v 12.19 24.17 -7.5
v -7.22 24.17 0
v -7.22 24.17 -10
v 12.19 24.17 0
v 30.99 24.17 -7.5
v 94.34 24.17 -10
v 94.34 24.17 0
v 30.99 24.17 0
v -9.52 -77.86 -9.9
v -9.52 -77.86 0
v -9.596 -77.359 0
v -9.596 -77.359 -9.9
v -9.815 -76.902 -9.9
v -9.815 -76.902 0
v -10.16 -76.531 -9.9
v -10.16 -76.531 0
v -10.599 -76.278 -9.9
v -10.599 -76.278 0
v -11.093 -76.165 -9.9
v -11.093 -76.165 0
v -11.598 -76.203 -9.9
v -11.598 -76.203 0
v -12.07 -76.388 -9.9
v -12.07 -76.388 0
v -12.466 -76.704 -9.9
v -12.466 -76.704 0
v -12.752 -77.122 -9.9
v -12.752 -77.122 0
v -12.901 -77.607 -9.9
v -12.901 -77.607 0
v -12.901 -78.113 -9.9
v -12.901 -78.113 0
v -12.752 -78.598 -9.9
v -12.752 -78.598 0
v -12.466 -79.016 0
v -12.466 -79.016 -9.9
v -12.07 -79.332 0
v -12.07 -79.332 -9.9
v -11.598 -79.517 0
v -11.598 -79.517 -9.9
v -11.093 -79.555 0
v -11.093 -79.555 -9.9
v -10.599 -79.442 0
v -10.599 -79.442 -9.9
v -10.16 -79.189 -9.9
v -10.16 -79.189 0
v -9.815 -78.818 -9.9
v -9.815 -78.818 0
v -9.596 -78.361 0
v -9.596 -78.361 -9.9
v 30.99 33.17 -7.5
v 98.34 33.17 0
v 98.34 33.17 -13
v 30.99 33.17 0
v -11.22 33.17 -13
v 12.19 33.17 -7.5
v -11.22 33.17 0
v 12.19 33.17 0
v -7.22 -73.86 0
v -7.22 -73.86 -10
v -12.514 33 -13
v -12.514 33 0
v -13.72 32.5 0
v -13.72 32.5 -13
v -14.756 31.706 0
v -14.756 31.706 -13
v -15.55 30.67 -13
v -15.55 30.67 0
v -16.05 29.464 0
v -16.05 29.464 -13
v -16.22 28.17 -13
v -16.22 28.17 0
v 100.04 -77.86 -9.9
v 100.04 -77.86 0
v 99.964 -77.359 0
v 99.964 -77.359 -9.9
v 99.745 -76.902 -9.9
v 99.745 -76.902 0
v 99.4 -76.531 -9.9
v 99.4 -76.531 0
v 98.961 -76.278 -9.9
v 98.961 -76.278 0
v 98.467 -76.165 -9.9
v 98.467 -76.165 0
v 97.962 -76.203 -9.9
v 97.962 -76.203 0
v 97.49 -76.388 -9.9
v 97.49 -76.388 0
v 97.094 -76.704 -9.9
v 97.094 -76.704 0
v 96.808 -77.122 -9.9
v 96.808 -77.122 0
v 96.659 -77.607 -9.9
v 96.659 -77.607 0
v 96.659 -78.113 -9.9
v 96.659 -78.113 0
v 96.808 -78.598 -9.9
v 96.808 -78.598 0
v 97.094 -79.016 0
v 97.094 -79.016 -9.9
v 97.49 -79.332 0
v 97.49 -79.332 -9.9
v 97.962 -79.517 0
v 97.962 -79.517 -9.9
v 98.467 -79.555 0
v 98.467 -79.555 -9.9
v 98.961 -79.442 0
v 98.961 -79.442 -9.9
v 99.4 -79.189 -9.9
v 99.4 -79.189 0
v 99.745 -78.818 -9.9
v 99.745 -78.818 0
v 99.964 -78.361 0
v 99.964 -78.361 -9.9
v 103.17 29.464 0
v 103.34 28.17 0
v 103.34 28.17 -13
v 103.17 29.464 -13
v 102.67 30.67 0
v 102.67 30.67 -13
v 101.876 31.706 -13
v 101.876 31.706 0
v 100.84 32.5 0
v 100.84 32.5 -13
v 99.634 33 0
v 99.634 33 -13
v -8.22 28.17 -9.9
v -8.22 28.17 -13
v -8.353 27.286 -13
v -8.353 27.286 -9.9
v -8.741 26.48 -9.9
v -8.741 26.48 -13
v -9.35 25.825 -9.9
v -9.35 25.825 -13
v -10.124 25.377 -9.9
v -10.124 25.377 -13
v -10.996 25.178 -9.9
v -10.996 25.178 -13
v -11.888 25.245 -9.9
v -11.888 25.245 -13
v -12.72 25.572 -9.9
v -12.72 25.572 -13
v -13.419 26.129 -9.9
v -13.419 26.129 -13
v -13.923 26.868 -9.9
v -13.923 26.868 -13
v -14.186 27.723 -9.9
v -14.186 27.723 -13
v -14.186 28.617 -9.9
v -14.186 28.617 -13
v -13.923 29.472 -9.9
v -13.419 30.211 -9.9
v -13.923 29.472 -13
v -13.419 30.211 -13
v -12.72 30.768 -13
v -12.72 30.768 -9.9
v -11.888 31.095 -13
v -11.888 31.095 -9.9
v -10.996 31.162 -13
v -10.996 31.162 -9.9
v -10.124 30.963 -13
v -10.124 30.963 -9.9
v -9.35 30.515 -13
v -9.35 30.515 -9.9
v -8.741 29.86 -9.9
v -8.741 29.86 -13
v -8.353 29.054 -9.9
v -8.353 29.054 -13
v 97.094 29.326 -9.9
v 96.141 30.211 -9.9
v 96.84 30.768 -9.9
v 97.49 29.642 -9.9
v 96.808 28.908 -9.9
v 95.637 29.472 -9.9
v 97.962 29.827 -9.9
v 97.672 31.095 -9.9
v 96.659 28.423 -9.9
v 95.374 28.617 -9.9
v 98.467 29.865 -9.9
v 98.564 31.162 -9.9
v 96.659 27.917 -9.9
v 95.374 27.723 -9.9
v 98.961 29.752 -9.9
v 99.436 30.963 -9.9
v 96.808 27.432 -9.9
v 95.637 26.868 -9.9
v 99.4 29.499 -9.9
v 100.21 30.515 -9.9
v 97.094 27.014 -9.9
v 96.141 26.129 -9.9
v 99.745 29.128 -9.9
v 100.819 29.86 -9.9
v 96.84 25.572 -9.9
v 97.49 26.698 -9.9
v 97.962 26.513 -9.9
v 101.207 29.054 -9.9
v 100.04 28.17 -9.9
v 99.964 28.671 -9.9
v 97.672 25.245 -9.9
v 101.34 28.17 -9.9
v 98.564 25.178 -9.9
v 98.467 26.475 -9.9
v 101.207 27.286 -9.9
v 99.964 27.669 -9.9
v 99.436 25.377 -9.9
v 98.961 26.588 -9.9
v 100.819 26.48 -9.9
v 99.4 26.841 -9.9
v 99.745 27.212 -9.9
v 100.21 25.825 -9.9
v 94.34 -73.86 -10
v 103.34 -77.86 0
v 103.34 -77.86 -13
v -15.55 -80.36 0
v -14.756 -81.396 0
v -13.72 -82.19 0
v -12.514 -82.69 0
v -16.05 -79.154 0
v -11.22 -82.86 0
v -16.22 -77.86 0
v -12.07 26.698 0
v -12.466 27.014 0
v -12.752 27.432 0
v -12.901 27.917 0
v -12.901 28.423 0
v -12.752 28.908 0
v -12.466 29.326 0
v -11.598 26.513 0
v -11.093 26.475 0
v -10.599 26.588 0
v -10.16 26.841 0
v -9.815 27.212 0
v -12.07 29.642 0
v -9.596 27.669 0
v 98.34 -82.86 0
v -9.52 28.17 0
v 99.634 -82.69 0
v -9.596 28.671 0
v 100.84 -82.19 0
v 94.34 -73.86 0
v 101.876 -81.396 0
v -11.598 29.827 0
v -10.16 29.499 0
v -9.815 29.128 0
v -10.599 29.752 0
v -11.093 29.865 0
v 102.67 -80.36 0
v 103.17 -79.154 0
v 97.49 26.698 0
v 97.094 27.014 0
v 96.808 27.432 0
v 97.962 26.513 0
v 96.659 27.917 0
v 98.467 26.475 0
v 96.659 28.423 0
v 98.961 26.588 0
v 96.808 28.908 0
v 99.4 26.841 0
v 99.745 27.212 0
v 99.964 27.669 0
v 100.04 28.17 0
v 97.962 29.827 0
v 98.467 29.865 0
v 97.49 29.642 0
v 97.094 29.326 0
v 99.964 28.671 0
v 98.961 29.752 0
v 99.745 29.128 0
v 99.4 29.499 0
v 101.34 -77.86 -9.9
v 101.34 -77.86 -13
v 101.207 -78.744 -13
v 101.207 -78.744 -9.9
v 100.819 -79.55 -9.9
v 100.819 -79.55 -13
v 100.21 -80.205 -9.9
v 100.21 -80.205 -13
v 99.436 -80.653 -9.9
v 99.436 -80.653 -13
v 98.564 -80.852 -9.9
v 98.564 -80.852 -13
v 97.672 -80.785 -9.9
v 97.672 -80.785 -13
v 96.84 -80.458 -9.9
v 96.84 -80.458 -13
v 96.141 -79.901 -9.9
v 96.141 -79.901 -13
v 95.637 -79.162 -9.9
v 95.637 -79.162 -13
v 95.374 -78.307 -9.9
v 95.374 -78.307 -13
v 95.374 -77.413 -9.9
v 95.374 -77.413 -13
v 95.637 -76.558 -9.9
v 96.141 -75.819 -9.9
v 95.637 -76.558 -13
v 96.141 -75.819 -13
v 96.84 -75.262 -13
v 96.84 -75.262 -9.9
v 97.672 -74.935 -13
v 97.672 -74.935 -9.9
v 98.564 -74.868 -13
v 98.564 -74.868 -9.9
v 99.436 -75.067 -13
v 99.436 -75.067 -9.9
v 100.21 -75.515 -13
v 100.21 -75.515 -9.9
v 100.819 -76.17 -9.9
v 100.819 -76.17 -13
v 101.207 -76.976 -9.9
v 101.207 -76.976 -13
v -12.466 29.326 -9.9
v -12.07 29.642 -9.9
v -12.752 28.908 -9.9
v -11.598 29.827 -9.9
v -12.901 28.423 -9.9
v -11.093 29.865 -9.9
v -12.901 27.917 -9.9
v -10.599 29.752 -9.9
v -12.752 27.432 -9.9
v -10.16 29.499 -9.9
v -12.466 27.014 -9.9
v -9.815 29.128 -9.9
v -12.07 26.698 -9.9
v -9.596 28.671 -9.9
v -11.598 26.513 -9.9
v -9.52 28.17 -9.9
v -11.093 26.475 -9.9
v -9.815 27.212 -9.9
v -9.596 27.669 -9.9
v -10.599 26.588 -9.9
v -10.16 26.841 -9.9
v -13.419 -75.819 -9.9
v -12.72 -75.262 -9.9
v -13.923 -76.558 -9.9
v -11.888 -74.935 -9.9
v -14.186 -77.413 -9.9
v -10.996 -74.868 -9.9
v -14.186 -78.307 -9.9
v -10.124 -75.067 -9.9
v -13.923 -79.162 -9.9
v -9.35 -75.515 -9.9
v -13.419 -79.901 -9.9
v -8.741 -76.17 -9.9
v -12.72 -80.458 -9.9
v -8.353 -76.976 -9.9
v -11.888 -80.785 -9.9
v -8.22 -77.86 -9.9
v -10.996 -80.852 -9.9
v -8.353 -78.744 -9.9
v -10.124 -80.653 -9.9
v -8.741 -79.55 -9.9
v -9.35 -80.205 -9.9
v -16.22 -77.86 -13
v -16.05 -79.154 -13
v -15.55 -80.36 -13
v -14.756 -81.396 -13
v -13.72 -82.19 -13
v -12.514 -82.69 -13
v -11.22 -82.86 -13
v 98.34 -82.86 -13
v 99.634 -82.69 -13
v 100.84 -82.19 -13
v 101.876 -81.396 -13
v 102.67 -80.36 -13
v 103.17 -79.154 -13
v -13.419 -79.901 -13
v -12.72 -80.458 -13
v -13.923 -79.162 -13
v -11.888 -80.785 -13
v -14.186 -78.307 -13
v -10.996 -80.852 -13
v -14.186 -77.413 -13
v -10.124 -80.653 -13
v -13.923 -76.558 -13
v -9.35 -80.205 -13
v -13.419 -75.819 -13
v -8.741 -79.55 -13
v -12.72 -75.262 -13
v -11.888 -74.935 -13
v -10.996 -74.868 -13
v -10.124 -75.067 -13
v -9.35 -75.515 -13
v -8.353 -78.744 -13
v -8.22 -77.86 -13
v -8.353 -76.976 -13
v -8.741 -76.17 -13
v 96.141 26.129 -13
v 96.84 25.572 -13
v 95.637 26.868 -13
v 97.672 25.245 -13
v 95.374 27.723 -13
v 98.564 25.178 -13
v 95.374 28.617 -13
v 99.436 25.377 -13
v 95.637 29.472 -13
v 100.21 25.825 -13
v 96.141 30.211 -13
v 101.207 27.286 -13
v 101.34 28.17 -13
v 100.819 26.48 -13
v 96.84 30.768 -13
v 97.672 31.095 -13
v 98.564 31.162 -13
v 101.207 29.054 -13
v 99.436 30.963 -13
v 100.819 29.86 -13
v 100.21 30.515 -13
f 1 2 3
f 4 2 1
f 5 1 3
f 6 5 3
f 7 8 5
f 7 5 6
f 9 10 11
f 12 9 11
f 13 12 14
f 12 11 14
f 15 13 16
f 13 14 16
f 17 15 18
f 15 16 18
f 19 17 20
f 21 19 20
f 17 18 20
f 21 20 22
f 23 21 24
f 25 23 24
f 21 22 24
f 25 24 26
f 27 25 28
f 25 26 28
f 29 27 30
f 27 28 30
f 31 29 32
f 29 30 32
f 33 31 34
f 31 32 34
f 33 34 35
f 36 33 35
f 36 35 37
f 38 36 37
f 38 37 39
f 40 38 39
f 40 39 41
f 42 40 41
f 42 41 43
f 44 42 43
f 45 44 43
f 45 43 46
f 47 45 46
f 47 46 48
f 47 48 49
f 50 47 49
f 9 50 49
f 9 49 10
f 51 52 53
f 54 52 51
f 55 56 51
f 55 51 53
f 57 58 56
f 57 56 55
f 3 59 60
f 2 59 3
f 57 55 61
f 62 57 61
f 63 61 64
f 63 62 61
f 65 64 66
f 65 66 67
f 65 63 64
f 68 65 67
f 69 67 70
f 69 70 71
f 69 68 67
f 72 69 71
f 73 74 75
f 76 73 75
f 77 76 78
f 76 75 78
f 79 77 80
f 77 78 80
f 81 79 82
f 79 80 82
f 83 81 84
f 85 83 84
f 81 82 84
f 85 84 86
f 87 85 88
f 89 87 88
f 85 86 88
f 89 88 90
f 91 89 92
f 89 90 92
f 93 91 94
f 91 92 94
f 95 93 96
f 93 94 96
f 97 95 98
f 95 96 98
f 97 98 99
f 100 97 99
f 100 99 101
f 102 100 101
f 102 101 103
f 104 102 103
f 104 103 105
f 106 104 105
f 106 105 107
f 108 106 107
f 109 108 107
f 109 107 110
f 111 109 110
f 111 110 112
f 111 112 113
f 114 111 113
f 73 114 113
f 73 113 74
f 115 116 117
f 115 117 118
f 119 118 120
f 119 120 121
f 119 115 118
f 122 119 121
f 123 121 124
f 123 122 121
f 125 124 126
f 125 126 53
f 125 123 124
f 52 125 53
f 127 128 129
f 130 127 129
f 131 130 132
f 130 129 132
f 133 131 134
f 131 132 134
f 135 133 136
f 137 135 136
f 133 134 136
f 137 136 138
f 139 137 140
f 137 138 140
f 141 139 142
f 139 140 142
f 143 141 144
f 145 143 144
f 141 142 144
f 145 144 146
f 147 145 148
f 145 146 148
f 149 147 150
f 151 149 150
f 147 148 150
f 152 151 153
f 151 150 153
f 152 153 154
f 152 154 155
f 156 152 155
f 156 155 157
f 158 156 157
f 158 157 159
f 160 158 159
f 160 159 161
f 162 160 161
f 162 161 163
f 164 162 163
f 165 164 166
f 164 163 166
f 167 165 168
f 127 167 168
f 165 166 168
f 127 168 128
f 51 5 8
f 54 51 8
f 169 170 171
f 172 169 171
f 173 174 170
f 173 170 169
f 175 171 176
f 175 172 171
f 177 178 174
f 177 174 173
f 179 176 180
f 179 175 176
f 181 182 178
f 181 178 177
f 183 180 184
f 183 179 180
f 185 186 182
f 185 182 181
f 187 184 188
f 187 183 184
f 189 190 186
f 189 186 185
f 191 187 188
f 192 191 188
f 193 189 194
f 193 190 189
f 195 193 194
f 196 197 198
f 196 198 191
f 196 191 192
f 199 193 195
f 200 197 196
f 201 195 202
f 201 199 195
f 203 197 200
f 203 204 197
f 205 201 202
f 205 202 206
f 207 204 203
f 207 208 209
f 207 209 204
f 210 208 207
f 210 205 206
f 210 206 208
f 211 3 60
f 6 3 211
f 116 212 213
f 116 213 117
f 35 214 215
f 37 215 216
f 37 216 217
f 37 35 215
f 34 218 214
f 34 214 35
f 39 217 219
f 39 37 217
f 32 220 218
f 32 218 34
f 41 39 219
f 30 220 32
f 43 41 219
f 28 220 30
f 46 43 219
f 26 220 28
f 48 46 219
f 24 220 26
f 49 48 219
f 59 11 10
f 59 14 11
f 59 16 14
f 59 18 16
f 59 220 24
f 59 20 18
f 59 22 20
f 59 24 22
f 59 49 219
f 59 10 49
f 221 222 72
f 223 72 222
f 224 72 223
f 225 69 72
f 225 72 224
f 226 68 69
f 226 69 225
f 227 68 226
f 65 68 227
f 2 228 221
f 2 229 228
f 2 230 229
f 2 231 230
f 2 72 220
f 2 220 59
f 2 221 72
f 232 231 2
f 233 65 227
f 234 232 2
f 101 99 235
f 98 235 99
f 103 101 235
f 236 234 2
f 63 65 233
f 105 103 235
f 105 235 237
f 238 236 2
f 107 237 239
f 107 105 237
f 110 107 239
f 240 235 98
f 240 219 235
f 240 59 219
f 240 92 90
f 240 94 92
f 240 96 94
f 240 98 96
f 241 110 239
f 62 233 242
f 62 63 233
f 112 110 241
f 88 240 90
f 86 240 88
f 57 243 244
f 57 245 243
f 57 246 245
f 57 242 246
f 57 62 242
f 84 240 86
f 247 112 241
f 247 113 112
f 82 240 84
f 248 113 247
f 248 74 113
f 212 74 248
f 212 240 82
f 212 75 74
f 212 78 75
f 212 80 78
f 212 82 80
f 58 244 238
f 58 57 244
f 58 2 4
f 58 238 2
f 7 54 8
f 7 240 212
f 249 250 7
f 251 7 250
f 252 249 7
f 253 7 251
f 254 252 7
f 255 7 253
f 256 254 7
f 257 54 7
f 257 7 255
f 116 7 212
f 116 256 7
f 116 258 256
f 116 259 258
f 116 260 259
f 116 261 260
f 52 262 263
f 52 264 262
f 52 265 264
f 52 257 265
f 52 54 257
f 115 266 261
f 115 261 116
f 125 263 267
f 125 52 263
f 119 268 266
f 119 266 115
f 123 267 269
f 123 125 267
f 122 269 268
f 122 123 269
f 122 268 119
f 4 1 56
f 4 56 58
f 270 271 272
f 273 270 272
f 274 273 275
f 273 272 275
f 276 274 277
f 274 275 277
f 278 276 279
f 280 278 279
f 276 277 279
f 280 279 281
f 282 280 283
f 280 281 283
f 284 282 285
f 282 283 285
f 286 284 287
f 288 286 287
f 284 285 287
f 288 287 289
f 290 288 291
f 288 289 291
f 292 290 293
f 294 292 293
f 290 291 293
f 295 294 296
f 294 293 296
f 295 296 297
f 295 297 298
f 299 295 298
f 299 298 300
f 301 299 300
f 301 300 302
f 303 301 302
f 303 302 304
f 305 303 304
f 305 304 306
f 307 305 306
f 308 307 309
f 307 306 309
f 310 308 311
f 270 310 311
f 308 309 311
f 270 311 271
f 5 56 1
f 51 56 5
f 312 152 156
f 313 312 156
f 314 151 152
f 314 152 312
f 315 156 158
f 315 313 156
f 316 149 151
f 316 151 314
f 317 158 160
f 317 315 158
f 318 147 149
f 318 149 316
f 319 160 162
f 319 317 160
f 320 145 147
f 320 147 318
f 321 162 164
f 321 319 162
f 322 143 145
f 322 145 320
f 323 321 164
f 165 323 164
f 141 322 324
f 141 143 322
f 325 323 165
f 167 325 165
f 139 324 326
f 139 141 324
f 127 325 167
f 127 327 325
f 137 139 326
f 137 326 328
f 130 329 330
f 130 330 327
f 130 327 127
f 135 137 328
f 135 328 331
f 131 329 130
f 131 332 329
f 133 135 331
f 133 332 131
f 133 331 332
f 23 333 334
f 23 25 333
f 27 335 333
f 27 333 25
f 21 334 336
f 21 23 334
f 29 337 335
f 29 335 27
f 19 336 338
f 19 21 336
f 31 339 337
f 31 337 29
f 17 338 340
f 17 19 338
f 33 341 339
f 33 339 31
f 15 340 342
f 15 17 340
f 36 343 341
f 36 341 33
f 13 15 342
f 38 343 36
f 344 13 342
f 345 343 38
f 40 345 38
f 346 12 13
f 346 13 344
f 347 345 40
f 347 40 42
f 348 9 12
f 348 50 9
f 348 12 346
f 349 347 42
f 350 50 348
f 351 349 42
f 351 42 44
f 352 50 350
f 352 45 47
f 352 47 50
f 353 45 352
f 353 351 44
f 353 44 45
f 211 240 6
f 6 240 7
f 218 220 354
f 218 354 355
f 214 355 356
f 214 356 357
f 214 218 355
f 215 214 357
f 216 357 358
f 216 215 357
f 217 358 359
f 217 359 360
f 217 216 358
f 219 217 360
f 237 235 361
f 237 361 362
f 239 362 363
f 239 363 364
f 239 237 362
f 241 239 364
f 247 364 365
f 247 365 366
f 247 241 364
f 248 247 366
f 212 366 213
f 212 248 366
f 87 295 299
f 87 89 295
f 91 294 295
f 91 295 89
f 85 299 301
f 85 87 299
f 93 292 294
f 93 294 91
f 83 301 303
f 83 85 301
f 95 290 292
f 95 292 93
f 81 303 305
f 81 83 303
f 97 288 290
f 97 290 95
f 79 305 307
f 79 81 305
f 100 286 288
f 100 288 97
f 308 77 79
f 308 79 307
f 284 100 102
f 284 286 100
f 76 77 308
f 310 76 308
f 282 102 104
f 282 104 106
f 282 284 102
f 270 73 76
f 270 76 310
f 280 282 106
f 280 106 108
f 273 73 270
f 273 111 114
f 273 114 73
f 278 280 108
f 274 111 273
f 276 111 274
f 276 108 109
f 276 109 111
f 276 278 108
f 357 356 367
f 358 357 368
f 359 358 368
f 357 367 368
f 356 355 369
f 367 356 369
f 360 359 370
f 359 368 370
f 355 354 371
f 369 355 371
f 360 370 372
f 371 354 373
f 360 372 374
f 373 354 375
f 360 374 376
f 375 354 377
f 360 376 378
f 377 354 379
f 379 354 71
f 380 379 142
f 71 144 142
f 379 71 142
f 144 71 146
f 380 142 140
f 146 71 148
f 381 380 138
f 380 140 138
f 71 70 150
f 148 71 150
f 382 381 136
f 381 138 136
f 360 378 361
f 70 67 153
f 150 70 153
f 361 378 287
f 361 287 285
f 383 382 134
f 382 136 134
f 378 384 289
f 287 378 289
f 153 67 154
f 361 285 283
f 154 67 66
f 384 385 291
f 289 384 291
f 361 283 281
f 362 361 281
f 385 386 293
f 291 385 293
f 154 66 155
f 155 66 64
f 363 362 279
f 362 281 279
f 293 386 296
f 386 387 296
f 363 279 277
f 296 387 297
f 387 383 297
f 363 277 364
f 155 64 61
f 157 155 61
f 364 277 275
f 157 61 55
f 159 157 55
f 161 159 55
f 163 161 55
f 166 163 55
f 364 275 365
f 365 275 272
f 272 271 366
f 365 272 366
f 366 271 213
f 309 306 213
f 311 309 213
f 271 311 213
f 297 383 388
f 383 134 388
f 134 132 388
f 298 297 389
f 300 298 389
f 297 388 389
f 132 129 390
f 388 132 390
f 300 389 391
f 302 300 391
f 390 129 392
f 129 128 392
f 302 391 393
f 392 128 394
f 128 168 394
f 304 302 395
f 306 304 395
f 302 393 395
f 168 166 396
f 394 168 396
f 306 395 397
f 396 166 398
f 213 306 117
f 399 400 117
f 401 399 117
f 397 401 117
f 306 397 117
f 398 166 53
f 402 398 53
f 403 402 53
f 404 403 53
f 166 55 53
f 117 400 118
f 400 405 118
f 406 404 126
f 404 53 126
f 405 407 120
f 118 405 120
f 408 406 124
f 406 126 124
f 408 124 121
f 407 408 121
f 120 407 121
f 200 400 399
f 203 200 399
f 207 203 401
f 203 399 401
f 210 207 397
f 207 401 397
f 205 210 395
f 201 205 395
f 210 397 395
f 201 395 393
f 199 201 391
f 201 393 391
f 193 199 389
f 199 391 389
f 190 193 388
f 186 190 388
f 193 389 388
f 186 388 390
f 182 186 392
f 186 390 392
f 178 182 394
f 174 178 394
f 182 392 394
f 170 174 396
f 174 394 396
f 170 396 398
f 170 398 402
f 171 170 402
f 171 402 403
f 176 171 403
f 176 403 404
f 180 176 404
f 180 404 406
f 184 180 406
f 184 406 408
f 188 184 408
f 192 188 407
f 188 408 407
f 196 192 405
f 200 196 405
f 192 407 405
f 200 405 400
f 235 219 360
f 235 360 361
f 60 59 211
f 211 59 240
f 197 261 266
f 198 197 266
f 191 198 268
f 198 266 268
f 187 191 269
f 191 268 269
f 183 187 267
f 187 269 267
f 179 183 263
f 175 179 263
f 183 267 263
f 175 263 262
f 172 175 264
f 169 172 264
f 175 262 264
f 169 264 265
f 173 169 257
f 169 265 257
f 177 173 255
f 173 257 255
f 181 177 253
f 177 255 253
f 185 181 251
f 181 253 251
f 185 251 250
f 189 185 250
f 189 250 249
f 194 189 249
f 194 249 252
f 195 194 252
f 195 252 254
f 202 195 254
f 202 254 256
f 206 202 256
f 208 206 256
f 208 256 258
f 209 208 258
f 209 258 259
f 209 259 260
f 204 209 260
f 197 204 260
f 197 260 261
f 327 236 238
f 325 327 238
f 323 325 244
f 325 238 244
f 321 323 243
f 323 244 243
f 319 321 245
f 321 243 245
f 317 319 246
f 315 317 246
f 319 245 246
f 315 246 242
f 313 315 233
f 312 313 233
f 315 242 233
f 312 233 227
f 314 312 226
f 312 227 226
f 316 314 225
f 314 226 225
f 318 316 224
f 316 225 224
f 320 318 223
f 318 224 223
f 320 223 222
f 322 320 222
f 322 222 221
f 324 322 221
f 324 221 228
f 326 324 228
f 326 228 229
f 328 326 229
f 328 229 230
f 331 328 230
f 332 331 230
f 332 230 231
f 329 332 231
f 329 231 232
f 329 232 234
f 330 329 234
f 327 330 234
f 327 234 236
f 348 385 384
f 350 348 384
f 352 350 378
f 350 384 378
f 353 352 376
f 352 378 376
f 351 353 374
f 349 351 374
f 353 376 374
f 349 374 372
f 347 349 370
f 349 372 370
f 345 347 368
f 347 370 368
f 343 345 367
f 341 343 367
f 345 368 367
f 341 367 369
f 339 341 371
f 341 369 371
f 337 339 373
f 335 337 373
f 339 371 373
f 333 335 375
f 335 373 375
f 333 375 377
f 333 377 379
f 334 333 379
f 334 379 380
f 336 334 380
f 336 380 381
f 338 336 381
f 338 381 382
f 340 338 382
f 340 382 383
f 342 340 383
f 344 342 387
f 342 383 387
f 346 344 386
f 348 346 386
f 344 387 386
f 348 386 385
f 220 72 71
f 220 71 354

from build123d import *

# Parameters (mm, degrees)
SKETCH_R        = 1.7
PAD_DEPTH       = 13
SKETCH001_W     = 101.56
SKETCH001_H     = 98.03
POCKET_DEPTH    = 10
SKETCH002_R     = 3
POCKET001_DEPTH = 3.1
SKETCH003_W     = 18.8
SKETCH003_H     = 7.5
POCKET002_DEPTH = 11


with BuildPart() as part:
    # Sketch → Pad (new body)
    with BuildSketch(Plane.XY):
        with BuildLine():
            Line((0, -5), (0, -111.03))
            ThreePointArc((0, -111.03), (1.464466, -114.565534), (5, -116.03))
            Line((5, -116.03), (114.56, -116.03))
            ThreePointArc((114.56, -116.03), (118.095534, -114.565534), (119.56, -111.03))
            Line((119.56, -111.03), (119.56, -5))
            ThreePointArc((119.56, -5), (118.095534, -1.464466), (114.56, 0))
            Line((114.56, 0), (5, 0))
            ThreePointArc((5, 0), (1.464466, -1.464466), (0, -5))
        make_face()
        with Locations((5, -5)):
            Circle(SKETCH_R, mode=Mode.SUBTRACT)
        with Locations((114.56, -5)):
            Circle(SKETCH_R, mode=Mode.SUBTRACT)
        with Locations((114.56, -111.03)):
            Circle(SKETCH_R, mode=Mode.SUBTRACT)
        with Locations((5, -111.03)):
            Circle(SKETCH_R, mode=Mode.SUBTRACT)
    extrude(amount=-PAD_DEPTH)

    # Sketch001 → Pocket (cut)
    with BuildSketch(Plane.XY):
        with Locations((59.78, -58.015)):
            Rectangle(SKETCH001_W, SKETCH001_H)
    extrude(amount=-POCKET_DEPTH, mode=Mode.SUBTRACT)

    # Sketch002 (on Face5 of Pocket) → Pocket001 (cut)
    with BuildSketch(Plane(origin=(0, 0, -13), x_dir=(1, 0, 0), z_dir=(0, 0, -1))):
        with Locations((5, 111.03)):
            Circle(SKETCH002_R)
        with Locations((114.56, 111.03)):
            Circle(SKETCH002_R)
        with Locations((5, 5)):
            Circle(SKETCH002_R)
        with Locations((114.56, 5)):
            Circle(SKETCH002_R)
    extrude(amount=-POCKET001_DEPTH, mode=Mode.SUBTRACT)

    # Sketch003 → Pocket002 (cut)
    with BuildSketch(Plane.XZ):
        with Locations((37.81, -3.75)):
            Rectangle(SKETCH003_W, SKETCH003_H)
    extrude(amount=POCKET002_DEPTH, mode=Mode.SUBTRACT)


with BuildPart() as part_1:
    # Body001 placement: moved
    add(part.part.moved(Location((-16.22, 33.17, 0))))


solid = part_1.part
